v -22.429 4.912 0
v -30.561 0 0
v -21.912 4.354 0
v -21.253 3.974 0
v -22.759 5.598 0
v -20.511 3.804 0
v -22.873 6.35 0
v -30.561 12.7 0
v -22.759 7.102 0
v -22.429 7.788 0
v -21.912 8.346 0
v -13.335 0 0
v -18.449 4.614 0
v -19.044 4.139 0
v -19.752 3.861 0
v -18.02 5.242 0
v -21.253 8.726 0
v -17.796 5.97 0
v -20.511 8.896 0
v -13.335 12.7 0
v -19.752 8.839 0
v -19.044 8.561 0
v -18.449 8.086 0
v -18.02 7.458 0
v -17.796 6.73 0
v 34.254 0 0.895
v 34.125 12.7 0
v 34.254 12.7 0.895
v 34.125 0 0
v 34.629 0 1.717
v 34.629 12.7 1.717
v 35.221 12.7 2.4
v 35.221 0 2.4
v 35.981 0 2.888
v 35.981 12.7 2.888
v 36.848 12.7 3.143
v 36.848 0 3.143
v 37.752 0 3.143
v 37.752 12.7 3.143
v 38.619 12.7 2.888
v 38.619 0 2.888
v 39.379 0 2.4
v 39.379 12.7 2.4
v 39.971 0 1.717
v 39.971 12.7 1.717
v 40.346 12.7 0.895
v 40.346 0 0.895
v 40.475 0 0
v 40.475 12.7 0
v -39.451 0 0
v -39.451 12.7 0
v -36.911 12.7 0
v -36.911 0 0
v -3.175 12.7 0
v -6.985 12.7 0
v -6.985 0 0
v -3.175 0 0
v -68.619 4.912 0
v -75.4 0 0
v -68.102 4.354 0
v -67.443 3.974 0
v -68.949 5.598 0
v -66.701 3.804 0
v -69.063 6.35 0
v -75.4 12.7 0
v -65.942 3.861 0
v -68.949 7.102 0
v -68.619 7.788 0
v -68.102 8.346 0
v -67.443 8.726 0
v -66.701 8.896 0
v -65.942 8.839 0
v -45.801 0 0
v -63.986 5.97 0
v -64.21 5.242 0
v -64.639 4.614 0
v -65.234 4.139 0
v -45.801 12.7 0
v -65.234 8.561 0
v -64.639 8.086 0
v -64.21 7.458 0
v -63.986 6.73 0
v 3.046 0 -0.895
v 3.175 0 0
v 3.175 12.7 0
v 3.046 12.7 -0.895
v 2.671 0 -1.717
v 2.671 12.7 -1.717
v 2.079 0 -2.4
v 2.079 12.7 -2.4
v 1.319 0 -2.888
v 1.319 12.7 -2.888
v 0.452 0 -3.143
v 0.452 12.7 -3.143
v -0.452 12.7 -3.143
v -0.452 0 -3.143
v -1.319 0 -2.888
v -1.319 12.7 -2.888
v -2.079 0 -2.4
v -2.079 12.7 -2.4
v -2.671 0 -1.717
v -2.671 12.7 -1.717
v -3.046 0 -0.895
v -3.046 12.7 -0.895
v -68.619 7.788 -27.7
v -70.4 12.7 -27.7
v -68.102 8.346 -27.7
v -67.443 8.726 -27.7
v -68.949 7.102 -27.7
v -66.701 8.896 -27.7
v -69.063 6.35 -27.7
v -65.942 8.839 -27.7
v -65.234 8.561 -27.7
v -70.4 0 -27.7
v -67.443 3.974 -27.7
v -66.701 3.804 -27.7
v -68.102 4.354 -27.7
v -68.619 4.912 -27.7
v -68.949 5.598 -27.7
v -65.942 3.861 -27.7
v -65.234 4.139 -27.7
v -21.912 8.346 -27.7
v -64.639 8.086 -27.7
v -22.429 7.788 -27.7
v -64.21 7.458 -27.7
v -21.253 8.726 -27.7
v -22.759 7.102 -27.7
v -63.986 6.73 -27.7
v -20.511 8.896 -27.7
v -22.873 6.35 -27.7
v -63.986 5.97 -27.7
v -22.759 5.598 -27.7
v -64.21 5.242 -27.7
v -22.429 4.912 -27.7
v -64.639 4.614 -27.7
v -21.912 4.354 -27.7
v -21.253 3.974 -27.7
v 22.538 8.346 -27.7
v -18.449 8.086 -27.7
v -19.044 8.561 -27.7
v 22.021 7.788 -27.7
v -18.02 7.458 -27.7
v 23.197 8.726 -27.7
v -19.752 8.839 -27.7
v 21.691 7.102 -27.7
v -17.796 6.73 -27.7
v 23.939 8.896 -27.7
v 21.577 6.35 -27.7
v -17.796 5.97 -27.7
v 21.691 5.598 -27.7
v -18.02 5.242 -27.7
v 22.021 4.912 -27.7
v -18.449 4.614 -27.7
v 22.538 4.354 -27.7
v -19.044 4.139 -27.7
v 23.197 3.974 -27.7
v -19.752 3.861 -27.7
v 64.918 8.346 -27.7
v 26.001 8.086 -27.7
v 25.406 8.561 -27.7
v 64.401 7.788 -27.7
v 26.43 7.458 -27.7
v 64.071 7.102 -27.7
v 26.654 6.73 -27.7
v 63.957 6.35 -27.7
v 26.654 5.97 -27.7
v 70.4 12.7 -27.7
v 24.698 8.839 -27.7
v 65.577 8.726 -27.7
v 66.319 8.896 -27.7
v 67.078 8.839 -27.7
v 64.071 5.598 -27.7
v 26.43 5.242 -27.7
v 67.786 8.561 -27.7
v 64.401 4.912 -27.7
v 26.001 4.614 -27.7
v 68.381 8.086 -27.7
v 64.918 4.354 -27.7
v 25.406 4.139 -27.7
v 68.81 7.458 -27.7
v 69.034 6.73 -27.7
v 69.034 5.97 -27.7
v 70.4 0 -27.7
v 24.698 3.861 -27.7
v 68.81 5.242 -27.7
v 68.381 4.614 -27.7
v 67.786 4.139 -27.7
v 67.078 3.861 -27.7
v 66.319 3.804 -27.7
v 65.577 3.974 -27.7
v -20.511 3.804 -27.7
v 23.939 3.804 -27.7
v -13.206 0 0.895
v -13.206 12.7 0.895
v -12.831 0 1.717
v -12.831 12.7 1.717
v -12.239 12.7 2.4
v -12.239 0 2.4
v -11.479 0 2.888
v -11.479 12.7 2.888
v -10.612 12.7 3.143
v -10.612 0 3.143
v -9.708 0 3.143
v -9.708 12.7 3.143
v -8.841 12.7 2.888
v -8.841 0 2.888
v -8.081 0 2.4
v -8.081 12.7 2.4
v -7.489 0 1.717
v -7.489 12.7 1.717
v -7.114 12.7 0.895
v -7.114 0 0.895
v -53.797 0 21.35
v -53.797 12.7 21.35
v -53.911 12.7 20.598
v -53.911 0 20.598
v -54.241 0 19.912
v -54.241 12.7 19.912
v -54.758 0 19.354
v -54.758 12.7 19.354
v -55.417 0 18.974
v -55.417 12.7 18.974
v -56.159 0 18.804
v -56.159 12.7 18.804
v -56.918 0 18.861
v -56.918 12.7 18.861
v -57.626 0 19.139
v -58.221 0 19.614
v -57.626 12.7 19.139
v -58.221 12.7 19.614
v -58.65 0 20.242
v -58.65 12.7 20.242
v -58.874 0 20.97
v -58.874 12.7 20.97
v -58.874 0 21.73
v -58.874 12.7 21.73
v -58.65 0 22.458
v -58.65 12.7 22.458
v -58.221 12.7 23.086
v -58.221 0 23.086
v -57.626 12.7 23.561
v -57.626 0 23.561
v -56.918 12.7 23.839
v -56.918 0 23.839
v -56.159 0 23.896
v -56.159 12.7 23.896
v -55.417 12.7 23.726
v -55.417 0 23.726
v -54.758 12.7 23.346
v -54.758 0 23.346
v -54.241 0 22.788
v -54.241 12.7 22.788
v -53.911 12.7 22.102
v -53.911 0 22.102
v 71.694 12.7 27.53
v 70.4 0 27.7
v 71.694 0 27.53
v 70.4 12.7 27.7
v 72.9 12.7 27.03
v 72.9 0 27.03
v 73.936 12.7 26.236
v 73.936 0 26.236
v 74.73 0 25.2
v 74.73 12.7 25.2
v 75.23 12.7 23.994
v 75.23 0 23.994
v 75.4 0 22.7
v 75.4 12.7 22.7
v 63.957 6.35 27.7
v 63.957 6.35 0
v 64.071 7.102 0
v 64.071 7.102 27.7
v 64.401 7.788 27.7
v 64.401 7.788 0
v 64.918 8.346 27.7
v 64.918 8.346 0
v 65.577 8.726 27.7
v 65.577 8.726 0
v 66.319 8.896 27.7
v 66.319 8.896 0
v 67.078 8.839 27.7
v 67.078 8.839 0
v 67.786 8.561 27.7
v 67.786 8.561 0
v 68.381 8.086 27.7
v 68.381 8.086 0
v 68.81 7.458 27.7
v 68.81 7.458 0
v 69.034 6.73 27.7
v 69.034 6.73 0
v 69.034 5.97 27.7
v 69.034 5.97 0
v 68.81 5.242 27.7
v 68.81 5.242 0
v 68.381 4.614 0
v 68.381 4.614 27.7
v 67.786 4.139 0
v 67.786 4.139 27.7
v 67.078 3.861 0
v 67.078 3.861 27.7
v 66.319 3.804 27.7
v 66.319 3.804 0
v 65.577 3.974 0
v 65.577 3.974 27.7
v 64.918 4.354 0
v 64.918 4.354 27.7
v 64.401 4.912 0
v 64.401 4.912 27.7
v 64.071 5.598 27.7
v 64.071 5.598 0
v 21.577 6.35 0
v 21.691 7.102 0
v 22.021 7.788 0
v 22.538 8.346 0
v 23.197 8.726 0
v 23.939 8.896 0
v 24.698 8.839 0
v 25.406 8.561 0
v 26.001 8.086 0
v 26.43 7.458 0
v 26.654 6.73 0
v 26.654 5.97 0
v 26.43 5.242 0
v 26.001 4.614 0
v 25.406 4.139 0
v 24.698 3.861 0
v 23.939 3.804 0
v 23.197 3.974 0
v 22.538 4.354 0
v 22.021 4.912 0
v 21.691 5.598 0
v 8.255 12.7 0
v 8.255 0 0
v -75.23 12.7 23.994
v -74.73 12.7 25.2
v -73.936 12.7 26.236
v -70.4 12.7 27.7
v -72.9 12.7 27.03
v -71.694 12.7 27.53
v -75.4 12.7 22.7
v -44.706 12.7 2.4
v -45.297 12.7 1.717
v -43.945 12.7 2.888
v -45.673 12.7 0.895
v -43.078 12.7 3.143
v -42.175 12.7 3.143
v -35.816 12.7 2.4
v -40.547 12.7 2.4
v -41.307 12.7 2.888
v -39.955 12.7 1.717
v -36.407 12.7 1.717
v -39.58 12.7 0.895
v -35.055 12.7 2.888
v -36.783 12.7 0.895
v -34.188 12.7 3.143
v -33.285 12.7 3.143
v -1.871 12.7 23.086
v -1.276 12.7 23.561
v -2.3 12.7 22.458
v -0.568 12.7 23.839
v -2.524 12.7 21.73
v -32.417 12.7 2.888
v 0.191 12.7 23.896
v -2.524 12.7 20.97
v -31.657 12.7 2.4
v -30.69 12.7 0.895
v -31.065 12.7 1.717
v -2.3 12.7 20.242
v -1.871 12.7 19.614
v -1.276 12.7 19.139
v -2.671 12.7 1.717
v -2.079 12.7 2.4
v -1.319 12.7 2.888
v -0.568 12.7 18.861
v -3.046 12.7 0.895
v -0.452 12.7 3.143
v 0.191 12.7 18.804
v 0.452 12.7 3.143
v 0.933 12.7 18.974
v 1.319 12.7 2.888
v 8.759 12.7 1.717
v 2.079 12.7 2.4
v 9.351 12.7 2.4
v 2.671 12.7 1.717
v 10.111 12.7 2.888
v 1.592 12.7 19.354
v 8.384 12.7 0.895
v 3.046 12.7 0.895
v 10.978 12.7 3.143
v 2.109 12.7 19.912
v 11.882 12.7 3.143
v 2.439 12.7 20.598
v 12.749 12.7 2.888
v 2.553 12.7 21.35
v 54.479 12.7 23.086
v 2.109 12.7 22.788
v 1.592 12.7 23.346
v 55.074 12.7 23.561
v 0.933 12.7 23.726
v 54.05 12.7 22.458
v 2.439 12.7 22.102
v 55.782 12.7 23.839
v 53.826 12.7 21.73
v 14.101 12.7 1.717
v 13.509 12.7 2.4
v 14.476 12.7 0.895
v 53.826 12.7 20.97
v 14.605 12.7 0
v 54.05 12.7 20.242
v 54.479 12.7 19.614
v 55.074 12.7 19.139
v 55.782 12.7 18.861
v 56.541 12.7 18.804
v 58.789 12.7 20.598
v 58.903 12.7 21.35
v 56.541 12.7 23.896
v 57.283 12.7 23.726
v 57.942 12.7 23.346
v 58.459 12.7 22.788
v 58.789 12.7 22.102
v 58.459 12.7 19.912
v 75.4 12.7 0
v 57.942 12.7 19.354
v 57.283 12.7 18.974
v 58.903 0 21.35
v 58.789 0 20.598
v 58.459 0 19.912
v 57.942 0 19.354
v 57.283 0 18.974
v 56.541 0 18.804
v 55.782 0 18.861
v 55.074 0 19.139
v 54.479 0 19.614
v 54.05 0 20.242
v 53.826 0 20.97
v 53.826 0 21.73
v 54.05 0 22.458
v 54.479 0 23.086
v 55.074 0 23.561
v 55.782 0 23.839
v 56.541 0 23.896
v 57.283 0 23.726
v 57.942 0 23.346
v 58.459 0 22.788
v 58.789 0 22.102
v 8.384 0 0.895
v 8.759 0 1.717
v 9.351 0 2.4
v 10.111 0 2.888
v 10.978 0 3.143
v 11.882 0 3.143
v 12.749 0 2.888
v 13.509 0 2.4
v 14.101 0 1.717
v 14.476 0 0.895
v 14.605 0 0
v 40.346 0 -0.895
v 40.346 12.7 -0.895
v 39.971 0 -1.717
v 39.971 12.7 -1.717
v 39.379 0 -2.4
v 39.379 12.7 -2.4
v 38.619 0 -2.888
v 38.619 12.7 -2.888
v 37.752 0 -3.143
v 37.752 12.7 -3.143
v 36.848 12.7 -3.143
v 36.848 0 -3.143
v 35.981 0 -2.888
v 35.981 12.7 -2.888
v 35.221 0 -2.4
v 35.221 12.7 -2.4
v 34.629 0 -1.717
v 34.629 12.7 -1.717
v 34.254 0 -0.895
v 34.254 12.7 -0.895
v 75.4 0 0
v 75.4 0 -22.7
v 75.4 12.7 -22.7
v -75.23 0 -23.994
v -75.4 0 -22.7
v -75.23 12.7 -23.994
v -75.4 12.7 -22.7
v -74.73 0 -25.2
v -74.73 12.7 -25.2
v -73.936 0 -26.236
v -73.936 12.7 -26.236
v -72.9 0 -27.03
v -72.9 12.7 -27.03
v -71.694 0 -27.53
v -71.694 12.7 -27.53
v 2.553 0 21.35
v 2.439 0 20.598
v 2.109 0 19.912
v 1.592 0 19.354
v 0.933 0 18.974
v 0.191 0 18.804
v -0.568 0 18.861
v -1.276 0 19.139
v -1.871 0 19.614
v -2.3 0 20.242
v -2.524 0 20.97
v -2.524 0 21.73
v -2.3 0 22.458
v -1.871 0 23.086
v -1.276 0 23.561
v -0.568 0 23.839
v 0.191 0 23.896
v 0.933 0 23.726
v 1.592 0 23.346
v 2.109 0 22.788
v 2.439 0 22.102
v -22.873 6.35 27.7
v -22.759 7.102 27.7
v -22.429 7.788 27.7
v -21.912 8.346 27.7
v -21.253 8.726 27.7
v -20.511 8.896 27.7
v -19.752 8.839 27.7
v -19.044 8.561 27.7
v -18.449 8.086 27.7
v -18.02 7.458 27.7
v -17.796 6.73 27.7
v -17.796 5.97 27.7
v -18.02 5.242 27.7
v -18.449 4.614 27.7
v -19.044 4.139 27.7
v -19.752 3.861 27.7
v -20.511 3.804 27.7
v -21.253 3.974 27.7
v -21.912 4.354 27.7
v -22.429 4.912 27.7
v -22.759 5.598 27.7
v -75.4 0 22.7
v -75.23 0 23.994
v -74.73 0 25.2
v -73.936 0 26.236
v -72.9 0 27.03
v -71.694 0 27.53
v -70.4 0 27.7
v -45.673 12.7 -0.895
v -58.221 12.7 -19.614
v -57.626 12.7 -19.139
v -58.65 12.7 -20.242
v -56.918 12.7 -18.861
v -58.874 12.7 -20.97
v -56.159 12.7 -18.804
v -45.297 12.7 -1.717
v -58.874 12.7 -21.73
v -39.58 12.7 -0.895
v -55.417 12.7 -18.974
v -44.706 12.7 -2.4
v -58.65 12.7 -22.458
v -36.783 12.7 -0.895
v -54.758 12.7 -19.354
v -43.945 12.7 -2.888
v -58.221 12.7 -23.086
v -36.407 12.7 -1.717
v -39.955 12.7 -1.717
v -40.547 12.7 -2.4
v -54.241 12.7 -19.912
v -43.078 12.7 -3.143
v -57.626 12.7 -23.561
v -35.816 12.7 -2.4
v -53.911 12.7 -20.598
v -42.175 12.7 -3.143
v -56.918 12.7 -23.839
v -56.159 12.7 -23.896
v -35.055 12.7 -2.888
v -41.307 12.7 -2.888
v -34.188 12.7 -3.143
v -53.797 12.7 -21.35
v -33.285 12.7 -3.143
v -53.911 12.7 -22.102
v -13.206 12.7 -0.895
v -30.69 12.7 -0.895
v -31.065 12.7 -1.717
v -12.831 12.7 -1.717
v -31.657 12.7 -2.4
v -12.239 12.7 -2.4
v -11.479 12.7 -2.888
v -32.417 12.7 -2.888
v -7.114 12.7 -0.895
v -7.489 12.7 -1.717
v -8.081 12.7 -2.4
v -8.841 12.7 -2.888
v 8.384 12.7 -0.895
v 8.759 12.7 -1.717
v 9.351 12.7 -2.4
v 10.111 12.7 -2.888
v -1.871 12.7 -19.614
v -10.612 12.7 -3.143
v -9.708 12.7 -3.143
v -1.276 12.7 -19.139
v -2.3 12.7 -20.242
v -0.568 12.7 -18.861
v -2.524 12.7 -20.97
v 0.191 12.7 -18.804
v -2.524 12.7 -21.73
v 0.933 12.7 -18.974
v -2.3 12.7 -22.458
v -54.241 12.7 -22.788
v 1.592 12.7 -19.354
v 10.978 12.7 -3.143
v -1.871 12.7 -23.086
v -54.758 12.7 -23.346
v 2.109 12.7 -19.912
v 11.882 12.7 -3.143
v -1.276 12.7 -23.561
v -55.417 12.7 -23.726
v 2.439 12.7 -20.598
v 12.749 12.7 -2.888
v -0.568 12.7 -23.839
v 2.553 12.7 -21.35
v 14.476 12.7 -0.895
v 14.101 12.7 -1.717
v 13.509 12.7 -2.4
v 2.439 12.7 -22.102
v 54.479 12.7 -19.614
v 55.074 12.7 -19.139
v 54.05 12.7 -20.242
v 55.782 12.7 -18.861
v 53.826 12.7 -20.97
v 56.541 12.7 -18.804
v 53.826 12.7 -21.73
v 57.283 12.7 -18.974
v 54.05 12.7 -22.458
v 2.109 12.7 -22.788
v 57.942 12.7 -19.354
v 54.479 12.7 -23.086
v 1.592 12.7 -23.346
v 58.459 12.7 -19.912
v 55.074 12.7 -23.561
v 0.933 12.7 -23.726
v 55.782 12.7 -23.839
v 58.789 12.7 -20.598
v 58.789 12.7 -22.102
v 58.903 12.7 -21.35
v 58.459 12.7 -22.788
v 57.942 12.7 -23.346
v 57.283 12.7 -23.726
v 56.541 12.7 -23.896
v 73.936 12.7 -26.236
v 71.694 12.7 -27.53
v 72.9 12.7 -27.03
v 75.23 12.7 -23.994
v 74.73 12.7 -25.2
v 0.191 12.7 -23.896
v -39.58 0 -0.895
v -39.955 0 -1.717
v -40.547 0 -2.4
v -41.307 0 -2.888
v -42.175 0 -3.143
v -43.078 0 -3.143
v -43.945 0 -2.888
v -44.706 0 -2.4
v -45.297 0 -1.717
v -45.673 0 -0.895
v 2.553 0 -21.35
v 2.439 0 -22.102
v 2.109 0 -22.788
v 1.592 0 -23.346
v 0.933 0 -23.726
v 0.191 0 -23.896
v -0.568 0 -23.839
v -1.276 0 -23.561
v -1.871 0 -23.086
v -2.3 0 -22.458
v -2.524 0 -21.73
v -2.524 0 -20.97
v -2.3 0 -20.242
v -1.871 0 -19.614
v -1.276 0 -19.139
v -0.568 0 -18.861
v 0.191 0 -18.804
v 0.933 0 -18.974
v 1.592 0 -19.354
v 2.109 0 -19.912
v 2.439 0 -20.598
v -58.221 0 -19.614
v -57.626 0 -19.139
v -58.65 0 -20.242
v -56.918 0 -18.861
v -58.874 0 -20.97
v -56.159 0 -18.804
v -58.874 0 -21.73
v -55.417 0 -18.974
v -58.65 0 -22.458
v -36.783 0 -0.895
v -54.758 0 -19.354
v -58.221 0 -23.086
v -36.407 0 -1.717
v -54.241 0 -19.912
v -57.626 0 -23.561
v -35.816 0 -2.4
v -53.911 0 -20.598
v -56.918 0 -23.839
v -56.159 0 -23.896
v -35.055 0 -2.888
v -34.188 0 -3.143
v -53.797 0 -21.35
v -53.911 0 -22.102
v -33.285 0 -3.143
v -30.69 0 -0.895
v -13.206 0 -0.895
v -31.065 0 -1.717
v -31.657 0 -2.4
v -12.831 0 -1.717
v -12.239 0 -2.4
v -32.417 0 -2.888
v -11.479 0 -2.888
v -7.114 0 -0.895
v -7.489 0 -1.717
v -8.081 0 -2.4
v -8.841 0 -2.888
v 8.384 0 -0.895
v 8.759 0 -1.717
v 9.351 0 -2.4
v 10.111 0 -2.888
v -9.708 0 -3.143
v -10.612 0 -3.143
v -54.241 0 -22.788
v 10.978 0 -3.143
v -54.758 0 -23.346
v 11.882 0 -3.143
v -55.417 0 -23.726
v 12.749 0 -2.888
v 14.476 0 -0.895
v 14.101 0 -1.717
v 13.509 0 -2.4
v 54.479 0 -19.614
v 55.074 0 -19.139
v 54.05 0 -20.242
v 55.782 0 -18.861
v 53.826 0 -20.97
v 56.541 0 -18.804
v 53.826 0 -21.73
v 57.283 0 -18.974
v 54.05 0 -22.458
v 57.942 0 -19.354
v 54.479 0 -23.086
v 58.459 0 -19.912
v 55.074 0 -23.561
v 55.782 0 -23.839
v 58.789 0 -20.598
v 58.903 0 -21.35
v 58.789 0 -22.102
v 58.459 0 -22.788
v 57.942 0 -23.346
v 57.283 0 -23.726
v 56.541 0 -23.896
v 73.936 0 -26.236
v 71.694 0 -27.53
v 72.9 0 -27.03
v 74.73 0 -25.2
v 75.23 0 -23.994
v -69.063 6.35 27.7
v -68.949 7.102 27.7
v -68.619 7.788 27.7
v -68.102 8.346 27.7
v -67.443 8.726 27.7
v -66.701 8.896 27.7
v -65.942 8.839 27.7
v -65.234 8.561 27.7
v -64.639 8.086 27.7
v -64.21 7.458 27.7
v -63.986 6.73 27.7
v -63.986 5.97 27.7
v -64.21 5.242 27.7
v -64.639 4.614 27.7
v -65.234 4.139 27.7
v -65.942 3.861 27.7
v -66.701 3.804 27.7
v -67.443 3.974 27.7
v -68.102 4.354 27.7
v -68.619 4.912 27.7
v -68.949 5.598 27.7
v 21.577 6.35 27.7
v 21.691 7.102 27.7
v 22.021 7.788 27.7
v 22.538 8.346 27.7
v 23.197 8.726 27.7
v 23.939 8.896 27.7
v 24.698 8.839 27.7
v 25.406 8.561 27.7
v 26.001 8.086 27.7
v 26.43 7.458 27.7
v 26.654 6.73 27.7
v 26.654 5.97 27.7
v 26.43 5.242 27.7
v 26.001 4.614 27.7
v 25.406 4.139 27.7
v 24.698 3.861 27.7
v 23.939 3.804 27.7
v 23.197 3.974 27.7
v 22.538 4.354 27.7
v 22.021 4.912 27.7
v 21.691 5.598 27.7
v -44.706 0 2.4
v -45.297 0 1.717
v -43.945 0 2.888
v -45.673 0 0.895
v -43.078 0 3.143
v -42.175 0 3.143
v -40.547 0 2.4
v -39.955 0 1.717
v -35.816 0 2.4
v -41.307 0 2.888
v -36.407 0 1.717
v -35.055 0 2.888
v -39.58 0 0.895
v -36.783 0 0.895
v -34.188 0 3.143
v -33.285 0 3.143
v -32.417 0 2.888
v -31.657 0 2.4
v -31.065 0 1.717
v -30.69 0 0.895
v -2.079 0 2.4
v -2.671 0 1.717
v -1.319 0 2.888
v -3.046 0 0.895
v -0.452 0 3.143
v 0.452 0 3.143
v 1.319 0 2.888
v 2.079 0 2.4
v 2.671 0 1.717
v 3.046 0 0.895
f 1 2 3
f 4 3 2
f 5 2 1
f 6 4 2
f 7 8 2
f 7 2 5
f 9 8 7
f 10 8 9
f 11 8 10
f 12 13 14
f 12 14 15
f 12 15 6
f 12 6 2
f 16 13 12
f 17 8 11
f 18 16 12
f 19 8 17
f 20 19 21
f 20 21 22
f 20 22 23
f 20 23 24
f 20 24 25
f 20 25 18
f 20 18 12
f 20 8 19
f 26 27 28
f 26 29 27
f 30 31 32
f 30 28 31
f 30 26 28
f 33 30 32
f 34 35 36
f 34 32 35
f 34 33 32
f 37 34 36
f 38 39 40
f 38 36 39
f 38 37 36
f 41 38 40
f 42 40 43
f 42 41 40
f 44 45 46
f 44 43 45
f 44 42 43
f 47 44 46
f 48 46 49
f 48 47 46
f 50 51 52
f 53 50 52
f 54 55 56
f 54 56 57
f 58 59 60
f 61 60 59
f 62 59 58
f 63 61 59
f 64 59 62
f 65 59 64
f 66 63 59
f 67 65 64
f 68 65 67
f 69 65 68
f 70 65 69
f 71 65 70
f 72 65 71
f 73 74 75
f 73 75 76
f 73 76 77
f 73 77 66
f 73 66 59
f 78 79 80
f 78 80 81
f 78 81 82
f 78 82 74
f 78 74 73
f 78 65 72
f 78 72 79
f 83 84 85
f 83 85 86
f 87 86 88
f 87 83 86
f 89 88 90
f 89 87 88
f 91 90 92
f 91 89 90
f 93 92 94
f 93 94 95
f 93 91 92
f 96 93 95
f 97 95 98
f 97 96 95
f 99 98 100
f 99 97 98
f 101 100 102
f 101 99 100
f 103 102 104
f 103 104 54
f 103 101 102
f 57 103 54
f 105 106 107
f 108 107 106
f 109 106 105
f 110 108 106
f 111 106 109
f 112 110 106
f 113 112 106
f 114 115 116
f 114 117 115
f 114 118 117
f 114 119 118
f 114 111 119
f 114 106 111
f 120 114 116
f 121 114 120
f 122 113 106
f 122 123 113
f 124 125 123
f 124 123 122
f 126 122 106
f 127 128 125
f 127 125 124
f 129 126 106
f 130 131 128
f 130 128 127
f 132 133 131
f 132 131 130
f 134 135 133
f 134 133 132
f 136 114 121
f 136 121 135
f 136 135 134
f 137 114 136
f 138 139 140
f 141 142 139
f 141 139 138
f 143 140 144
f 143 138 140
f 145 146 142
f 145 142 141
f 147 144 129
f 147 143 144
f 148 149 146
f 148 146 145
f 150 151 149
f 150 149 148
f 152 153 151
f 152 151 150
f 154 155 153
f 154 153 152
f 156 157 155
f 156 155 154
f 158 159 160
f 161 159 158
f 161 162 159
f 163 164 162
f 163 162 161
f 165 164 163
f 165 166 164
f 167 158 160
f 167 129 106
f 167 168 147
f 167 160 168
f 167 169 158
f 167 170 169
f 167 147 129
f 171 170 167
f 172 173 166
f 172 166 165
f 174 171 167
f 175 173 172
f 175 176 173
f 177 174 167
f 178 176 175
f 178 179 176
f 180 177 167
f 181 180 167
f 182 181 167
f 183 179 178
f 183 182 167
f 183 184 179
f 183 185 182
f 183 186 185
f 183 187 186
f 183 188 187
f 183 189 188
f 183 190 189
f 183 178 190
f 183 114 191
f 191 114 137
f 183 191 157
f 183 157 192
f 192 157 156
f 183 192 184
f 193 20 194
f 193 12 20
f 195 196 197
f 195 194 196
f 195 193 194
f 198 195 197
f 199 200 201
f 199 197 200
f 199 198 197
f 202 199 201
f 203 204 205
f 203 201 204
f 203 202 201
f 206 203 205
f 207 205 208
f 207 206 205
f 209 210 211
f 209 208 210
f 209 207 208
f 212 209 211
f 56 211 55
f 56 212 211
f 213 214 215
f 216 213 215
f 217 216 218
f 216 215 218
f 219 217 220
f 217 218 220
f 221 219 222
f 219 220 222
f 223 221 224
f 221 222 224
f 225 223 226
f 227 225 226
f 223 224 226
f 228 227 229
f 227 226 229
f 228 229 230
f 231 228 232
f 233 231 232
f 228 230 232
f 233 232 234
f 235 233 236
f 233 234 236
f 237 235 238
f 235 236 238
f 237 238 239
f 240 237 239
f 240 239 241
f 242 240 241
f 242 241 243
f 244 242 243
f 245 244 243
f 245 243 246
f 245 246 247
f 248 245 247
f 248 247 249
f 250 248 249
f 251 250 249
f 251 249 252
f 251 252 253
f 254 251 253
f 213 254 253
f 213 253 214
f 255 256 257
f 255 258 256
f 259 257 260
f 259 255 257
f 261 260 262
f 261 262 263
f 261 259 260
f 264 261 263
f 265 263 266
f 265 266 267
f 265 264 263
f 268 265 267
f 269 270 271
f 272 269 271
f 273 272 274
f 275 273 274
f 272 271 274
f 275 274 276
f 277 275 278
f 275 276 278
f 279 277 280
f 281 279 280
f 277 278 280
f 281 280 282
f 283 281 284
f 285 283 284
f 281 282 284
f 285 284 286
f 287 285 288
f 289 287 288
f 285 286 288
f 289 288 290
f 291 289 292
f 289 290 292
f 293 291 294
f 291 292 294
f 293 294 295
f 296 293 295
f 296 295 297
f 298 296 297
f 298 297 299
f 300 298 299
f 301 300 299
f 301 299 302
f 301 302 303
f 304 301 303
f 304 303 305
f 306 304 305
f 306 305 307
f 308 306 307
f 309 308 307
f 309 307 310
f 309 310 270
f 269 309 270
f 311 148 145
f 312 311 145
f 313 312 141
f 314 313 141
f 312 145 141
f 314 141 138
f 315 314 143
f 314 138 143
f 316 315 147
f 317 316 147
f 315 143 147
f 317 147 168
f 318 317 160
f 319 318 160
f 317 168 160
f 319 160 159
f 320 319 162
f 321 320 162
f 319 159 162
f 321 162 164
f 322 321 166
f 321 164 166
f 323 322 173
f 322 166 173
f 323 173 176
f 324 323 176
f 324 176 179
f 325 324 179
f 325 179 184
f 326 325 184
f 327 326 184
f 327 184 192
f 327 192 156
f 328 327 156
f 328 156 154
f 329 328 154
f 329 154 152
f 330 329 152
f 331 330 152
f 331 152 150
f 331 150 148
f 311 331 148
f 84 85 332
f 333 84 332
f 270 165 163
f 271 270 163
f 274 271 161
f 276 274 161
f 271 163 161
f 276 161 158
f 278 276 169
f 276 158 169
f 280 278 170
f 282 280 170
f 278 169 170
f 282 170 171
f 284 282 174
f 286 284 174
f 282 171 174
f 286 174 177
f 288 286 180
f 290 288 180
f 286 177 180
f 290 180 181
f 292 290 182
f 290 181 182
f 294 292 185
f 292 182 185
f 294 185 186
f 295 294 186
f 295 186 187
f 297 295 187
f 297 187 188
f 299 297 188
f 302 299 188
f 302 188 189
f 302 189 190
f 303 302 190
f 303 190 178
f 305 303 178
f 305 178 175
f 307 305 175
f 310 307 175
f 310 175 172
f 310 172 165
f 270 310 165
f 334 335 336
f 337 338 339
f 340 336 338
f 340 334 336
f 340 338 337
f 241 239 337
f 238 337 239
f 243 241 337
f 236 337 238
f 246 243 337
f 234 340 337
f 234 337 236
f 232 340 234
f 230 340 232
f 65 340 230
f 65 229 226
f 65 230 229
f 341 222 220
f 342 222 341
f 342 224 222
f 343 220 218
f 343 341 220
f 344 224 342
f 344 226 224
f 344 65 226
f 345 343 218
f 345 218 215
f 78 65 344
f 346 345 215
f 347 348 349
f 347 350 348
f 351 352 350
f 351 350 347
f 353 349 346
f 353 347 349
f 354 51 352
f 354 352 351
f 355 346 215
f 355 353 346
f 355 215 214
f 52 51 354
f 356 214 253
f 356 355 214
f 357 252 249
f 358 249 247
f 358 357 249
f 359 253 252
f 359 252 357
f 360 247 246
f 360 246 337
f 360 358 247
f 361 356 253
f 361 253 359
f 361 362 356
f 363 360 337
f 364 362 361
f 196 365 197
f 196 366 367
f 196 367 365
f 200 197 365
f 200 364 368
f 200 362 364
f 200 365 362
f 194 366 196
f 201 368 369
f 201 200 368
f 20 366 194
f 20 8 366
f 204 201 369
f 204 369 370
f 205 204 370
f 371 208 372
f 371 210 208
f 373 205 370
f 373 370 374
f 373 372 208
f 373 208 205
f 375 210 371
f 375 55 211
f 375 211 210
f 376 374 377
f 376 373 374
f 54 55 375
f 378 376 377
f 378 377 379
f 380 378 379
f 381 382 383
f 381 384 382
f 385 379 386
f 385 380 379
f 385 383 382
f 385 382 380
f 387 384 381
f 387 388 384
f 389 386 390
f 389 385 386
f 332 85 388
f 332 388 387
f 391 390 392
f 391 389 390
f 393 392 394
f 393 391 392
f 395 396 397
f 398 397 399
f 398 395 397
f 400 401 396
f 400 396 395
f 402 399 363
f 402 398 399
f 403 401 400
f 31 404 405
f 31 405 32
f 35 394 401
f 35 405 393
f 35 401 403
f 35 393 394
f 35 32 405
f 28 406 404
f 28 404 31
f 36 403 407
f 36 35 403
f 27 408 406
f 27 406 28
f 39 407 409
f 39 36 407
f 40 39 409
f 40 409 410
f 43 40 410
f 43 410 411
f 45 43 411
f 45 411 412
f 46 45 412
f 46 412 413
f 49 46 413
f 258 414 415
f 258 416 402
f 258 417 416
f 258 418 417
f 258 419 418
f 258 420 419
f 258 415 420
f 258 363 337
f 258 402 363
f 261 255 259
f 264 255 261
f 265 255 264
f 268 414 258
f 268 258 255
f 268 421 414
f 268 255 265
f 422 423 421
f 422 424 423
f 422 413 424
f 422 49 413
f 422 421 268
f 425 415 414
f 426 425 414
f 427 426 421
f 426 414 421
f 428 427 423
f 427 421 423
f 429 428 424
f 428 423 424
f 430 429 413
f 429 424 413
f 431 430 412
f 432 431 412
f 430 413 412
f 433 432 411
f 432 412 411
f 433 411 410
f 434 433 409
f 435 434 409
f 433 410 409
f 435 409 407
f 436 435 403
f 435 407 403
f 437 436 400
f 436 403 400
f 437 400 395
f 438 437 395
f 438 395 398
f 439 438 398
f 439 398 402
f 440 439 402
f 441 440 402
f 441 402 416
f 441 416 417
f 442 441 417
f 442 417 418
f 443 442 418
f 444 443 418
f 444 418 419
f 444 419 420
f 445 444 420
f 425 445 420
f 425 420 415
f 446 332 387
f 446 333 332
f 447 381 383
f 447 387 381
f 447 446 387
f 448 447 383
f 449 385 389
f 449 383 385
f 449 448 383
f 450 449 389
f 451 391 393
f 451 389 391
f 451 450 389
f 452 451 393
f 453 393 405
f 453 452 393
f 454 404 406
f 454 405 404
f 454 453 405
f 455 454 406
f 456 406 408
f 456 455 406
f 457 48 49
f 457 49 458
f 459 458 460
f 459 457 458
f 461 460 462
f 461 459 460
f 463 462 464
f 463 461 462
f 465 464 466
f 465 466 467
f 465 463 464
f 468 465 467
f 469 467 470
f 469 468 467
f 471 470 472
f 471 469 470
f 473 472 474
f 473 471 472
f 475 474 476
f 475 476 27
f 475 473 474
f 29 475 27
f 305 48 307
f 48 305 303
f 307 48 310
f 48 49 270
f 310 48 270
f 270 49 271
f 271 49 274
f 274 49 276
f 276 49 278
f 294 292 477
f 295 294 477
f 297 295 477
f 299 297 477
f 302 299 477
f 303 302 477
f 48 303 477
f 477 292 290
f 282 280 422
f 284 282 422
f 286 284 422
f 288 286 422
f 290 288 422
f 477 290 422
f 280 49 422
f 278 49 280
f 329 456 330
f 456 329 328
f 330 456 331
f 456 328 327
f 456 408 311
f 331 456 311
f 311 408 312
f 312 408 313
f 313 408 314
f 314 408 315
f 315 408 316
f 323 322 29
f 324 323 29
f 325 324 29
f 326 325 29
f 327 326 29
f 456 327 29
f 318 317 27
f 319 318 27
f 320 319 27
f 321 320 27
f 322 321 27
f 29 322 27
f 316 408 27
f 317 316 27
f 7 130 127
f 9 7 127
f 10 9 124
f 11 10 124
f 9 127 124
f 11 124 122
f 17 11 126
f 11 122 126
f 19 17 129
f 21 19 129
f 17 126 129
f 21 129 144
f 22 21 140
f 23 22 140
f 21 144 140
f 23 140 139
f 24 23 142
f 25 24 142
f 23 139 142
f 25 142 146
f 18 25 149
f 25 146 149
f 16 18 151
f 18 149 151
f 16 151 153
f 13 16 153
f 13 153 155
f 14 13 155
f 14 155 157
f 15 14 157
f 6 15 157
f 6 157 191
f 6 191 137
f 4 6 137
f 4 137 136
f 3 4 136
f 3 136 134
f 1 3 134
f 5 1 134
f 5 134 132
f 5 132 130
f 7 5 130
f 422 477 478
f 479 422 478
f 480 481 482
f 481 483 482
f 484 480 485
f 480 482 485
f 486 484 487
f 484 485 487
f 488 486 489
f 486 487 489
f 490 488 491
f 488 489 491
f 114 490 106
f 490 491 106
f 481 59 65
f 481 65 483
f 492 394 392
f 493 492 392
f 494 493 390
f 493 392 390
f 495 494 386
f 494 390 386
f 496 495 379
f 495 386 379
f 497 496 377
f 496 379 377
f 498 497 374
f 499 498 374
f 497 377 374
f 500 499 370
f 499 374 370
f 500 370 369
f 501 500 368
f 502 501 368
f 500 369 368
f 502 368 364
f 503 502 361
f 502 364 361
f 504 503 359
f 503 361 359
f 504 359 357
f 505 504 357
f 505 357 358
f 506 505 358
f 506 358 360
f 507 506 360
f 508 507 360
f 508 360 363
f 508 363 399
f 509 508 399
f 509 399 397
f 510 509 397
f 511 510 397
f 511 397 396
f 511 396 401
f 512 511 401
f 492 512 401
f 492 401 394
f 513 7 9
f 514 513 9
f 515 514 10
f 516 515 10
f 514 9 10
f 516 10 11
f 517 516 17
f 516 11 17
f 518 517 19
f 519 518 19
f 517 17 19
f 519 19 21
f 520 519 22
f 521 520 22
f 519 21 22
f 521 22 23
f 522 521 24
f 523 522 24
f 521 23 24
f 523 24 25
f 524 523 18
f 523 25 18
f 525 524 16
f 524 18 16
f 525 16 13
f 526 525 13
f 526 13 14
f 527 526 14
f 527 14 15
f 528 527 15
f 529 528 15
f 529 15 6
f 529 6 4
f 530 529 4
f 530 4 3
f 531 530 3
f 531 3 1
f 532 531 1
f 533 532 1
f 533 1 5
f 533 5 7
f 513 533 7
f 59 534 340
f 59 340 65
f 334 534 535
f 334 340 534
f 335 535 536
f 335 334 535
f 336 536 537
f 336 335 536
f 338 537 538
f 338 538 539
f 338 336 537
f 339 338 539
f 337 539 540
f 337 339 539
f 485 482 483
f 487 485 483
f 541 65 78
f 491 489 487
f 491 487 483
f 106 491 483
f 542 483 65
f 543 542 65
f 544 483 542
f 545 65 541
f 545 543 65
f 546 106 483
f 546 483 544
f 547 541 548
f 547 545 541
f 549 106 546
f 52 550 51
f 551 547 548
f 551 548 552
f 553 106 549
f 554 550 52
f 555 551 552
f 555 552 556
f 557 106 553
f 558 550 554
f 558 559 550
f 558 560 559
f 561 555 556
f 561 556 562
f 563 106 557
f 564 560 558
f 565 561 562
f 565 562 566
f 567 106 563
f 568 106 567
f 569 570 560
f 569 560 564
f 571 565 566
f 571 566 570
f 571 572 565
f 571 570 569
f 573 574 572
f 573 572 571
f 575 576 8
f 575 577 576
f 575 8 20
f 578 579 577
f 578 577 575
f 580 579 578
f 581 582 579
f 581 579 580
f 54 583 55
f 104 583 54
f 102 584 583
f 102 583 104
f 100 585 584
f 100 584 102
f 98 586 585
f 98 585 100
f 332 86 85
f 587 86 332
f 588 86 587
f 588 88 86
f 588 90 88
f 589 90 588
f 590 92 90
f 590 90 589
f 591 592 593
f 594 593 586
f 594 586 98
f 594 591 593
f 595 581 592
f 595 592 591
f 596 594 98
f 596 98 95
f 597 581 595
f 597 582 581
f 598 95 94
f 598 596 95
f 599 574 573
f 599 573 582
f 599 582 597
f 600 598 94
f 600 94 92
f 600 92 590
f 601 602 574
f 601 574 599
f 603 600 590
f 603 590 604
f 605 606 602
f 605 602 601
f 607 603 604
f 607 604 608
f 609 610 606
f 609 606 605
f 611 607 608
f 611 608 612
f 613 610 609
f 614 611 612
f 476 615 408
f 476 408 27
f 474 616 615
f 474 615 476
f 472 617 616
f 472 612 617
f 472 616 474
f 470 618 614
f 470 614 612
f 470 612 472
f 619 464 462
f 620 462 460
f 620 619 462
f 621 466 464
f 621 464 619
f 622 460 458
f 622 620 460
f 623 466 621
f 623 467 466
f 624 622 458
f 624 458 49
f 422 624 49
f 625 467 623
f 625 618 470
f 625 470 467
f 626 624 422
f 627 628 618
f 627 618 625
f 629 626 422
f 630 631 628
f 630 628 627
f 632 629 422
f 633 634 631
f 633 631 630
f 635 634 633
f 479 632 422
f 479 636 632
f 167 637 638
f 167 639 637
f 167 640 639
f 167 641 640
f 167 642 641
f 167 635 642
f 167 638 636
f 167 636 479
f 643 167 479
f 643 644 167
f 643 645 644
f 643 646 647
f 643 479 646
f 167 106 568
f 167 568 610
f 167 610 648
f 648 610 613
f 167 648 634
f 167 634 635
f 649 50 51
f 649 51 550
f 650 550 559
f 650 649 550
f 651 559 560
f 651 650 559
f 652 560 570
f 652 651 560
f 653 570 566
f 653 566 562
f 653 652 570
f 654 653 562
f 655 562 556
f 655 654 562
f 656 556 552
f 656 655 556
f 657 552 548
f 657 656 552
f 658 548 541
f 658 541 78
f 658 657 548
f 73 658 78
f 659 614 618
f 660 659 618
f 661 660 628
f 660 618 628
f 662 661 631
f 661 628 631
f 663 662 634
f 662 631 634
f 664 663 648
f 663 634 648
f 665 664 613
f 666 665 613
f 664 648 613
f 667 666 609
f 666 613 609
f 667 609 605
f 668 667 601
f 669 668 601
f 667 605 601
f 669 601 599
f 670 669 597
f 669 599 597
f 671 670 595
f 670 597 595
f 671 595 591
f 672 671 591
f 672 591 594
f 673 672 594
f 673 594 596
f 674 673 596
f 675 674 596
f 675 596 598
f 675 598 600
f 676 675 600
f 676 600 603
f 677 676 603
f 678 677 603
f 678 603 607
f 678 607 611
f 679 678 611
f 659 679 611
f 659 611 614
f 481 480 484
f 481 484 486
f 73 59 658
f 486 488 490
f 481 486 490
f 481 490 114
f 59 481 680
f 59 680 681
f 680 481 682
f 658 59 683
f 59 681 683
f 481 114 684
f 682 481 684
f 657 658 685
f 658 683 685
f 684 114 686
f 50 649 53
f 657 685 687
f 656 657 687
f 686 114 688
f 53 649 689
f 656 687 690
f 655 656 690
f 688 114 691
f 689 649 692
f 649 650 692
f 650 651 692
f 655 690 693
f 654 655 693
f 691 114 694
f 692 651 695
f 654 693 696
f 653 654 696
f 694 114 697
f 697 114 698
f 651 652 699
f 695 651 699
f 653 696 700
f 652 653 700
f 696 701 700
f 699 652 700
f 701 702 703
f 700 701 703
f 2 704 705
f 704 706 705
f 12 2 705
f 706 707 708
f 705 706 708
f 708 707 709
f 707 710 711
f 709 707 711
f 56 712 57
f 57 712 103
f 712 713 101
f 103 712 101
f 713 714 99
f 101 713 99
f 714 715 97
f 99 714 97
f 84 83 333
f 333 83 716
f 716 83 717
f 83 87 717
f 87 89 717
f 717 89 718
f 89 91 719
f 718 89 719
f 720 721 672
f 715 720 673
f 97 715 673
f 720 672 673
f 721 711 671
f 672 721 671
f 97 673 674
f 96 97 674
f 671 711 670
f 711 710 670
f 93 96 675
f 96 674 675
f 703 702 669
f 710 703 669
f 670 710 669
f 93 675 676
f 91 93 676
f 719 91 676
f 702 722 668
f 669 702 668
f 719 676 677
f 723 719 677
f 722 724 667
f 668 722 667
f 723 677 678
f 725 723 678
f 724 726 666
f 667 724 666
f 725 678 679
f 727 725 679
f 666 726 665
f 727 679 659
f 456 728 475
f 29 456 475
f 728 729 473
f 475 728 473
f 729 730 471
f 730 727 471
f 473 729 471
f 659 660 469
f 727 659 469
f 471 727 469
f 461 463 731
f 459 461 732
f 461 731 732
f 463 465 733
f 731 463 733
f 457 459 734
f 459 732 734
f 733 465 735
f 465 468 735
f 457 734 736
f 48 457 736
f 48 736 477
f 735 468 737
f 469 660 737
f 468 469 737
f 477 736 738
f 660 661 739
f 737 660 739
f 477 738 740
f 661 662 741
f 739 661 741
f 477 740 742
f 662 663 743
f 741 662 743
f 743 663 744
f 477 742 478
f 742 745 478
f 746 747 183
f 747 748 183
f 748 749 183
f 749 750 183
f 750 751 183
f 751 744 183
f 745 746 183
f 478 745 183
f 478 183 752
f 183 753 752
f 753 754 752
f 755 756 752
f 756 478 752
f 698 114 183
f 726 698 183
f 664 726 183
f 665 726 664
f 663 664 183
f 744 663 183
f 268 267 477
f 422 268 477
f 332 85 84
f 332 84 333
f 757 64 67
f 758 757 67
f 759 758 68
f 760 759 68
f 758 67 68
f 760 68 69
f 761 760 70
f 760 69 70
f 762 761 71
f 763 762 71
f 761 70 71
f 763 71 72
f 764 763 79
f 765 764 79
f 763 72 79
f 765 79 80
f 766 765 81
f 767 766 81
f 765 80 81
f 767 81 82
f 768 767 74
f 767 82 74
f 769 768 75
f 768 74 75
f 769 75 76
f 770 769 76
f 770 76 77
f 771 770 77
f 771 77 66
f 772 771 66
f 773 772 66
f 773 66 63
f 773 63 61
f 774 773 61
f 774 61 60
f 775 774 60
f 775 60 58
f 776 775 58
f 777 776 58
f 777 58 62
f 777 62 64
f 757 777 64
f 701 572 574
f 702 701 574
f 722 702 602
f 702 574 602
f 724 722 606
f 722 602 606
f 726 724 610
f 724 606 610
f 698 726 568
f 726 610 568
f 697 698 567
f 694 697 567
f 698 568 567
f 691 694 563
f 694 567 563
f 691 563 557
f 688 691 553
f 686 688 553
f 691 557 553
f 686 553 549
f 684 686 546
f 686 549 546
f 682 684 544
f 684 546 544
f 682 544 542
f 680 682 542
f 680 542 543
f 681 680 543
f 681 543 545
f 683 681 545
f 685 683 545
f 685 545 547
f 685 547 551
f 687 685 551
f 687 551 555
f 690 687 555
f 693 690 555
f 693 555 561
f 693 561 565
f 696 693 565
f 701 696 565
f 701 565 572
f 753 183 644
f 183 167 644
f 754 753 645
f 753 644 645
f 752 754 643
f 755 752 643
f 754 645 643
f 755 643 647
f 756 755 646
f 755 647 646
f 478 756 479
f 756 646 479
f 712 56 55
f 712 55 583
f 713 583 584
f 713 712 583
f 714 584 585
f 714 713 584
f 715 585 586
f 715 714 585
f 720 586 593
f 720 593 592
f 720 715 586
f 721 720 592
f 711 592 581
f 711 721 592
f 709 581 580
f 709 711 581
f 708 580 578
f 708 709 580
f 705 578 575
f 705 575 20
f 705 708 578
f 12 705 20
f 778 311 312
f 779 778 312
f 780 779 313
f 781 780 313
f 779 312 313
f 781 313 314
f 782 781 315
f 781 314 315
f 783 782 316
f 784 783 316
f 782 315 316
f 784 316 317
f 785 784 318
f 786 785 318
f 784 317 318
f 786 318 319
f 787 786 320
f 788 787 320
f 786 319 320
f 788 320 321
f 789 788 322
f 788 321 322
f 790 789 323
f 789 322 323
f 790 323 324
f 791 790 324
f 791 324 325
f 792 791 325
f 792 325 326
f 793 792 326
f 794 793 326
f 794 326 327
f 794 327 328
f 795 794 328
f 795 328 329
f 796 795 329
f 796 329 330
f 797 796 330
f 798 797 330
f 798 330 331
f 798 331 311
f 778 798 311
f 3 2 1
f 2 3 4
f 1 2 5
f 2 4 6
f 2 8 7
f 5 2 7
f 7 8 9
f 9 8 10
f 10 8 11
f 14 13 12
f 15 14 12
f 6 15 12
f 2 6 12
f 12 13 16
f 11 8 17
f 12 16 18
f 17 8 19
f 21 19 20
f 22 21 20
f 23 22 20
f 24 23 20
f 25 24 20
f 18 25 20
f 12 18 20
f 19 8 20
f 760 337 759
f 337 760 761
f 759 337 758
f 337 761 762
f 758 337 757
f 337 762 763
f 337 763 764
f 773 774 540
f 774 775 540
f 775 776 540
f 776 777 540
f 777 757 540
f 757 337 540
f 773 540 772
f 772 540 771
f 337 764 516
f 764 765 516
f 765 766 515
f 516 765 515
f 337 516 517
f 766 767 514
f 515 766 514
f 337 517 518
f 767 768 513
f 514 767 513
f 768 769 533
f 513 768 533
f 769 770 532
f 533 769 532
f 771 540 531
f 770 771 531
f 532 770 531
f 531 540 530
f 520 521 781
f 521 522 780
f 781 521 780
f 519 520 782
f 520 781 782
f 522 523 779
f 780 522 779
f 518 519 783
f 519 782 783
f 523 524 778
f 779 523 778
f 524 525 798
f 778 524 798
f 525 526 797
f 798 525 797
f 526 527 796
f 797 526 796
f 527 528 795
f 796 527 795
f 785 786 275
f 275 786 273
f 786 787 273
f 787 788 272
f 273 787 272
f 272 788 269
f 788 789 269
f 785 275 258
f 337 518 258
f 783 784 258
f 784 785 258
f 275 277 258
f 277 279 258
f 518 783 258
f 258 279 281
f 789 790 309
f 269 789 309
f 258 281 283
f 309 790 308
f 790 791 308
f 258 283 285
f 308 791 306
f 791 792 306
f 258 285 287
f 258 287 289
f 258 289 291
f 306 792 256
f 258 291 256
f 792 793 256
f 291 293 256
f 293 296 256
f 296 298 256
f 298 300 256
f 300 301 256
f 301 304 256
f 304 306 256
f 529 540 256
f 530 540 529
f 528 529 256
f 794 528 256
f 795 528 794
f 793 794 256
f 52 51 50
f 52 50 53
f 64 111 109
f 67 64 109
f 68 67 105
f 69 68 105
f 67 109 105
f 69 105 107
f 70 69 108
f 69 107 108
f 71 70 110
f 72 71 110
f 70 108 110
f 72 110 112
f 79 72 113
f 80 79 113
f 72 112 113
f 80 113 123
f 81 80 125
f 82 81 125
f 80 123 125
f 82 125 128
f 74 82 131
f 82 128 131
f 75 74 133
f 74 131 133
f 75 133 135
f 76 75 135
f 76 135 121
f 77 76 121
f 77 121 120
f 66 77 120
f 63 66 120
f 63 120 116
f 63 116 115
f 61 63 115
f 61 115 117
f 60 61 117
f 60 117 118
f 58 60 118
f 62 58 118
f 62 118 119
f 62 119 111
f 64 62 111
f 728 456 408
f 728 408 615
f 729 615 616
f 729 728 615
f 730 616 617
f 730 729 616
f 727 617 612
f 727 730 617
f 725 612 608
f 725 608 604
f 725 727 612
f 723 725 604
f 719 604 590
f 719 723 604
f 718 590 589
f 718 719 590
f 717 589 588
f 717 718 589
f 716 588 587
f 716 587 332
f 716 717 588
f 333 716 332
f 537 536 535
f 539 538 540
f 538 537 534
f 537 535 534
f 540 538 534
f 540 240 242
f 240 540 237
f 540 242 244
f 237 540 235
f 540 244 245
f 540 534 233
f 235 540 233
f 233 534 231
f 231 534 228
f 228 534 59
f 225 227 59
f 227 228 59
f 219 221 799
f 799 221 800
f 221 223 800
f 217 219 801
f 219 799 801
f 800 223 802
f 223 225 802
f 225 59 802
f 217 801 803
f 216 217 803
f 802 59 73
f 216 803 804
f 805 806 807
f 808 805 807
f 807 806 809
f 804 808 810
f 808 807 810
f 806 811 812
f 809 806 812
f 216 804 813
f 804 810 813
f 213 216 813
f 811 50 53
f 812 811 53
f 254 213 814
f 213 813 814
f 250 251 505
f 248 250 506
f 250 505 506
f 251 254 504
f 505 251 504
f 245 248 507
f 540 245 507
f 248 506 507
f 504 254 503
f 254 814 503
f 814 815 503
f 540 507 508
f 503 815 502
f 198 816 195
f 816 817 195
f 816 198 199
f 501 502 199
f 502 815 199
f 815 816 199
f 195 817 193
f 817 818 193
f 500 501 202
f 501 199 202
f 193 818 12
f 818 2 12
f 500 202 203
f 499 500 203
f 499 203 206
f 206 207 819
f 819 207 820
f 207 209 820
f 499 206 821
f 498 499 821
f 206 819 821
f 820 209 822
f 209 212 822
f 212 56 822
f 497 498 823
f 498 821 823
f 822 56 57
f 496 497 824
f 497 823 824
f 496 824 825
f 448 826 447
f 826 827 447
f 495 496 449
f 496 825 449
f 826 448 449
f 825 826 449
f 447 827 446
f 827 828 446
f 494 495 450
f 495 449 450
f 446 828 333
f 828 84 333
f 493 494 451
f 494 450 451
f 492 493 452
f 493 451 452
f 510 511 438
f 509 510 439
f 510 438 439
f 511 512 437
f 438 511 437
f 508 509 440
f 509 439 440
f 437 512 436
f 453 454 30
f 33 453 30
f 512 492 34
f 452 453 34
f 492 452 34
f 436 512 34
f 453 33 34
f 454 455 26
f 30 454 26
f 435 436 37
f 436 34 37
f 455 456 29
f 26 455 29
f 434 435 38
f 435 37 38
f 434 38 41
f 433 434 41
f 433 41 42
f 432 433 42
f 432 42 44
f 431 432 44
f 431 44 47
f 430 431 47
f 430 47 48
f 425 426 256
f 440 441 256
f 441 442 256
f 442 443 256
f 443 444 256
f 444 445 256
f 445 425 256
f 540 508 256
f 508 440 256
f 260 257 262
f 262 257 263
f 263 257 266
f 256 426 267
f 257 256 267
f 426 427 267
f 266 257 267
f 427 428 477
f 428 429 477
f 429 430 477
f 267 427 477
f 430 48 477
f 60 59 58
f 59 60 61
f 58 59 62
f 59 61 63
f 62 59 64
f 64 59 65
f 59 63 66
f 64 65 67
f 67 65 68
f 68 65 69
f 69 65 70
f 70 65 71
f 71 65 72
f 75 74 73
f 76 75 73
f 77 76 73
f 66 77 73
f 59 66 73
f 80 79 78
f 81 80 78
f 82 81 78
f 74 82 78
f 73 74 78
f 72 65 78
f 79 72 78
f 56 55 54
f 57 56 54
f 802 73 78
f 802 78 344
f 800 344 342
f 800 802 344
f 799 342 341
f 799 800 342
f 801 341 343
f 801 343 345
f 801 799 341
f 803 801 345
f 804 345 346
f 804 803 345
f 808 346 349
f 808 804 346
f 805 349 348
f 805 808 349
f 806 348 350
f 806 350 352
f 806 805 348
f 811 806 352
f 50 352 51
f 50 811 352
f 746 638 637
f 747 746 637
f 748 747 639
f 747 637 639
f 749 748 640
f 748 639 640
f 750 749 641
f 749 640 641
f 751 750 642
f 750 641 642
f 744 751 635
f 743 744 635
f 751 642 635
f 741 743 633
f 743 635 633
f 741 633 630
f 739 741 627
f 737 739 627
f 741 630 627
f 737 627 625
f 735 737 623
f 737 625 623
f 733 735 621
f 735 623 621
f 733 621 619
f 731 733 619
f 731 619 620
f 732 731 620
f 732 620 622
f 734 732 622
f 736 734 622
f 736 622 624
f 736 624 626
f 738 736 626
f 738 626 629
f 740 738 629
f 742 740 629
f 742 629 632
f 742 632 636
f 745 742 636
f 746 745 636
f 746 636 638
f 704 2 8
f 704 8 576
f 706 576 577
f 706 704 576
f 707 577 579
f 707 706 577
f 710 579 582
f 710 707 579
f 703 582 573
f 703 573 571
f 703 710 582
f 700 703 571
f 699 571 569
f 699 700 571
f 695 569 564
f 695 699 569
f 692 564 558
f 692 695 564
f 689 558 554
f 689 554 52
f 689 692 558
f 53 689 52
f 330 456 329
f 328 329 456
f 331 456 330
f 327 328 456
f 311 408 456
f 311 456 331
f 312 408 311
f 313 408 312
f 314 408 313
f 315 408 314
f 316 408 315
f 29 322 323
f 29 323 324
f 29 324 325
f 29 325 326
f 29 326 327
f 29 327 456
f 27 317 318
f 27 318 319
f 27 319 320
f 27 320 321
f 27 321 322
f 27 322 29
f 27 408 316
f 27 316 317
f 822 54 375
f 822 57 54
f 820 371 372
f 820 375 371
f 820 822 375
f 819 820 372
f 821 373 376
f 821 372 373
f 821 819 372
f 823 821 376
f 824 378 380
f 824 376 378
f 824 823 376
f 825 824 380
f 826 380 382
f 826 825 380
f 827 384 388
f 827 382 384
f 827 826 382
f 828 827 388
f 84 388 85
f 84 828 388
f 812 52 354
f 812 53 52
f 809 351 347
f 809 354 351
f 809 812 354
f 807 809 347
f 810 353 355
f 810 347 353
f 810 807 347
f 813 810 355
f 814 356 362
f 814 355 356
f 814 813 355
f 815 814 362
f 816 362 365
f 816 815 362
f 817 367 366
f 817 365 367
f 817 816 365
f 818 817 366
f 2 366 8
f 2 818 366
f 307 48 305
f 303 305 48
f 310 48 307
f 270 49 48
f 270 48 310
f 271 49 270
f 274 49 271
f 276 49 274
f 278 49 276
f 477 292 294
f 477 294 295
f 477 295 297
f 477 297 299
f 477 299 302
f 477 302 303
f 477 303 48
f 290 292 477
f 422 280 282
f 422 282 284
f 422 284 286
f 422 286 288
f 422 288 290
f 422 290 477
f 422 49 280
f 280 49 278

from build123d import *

# Parameters (mm, degrees)
SKETCH1_W              = 150.8
SKETCH1_H              = 55.4
BOSS_EXTRUDE1_DEPTH    = 12.7
FILLET1_R              = 5
F_10_CLEARANCE_HOLE1_D = 5.1054
BOSS_EXTRUDE2_START    = -12.7
SKETCH5_R              = 3.175
BOSS_EXTRUDE2_DEPTH    = 12.7
F_10_CLEARANCE_HOLE2_D = 5.1054


with BuildPart() as part:
    # Sketch1 → Boss-Extrude1 (new body)
    with BuildSketch(Plane(origin=(0, 0, 0), x_dir=(1, 0, 0), z_dir=(0, 1, 0))):
        Rectangle(SKETCH1_W, SKETCH1_H)
        with BuildLine():
            Line((45, 15), (-45, 15))
            ThreePointArc((-45, 15), (-48.535533906, 13.535533906), (-50, 10))
            Line((-50, 10), (-50, -10))
            ThreePointArc((-50, -10), (-48.535533906, -13.535533906), (-45, -15))
            Line((-45, -15), (45, -15))
            ThreePointArc((45, -15), (48.535533906, -13.535533906), (50, -10))
            Line((50, -10), (50, 10))
            ThreePointArc((50, 10), (48.535533906, 13.535533906), (45, 15))
        make_face(mode=Mode.SUBTRACT)
    extrude(amount=BOSS_EXTRUDE1_DEPTH)

    # Fillet1
    fillet1_edges = [part.edges().sort_by_distance(p)[0] for p in [
        (75.4, 6.35, 27.7),
        (-75.4, 6.35, 27.7),
        (-75.4, 6.35, -27.7),
        (75.4, 6.35, -27.7),
    ]]
    fillet(fillet1_edges, radius=FILLET1_R)

    # #10 Clearance Hole1 (through all)
    with Locations(Plane(origin=(0, 0, 0), x_dir=(-1, 0, 0), z_dir=(0, -1, 0))):
        with Locations((56.35, 21.35), (0, 21.35), (-56.35, 21.35), (-56.35, -21.35), (0, -21.35), (56.35, -21.35)):
            Hole(F_10_CLEARANCE_HOLE1_D / 2)

    # Sketch5 → Boss-Extrude2 (add)
    with BuildSketch(Plane(origin=(0, 12.7, 0), x_dir=(1, 0, 0), z_dir=(0, 1, 0)).offset(BOSS_EXTRUDE2_START)):
        with BuildLine():
            Line((-50, 10), (-50, -10))
            ThreePointArc((-50, -10), (-48.535533906, -13.535533906), (-45, -15))
            Line((-45, -15), (45, -15))
            ThreePointArc((45, -15), (48.535533906, -13.535533906), (50, -10))
            Line((50, -10), (50, 10))
            ThreePointArc((50, 10), (48.535533906, 13.535533906), (45, 15))
            Line((45, 15), (-45, 15))
            ThreePointArc((-45, 15), (-48.535533906, 13.535533906), (-50, 10))
        make_face()
        with Locations(Location((-42.626400921, 0, 0), (0, 0, 270))):
            Circle(SKETCH5_R, mode=Mode.SUBTRACT)
        with Locations(Location((-33.736400921, 0, 0), (0, 0, 270))):
            Circle(SKETCH5_R, mode=Mode.SUBTRACT)
        with Locations(Location((-10.16, 0, 0), (0, 0, 270))):
            Circle(SKETCH5_R, mode=Mode.SUBTRACT)
        with Locations(Location((0, 0, 0), (0, 0, 270))):
            Circle(SKETCH5_R, mode=Mode.SUBTRACT)
        with Locations(Location((37.3, 0, 0), (0, 0, 270))):
            Circle(SKETCH5_R, mode=Mode.SUBTRACT)
        with Locations(Location((11.43, 0, 0), (0, 0, 270))):
            Circle(SKETCH5_R, mode=Mode.SUBTRACT)
    extrude(amount=BOSS_EXTRUDE2_DEPTH)

    # #10 Clearance Hole2 (through all)
    with Locations(Plane.XY.offset(27.7)):
        with Locations((66.51, 6.35), (-66.51, 6.35), (-20.32, 6.35), (24.13, 6.35)):
            Hole(F_10_CLEARANCE_HOLE2_D / 2)


with BuildPart() as body_2:
    # Split2: the piece on the far side of the plane
    add(part.part)
    split(bisect_by=Plane.XY, keep=Keep.BOTTOM)


with BuildPart() as part_1:
    add(part.part)

    # Split2
    split(bisect_by=Plane.XY, keep=Keep.TOP)


solid = Compound([body_2.part, part_1.part])
